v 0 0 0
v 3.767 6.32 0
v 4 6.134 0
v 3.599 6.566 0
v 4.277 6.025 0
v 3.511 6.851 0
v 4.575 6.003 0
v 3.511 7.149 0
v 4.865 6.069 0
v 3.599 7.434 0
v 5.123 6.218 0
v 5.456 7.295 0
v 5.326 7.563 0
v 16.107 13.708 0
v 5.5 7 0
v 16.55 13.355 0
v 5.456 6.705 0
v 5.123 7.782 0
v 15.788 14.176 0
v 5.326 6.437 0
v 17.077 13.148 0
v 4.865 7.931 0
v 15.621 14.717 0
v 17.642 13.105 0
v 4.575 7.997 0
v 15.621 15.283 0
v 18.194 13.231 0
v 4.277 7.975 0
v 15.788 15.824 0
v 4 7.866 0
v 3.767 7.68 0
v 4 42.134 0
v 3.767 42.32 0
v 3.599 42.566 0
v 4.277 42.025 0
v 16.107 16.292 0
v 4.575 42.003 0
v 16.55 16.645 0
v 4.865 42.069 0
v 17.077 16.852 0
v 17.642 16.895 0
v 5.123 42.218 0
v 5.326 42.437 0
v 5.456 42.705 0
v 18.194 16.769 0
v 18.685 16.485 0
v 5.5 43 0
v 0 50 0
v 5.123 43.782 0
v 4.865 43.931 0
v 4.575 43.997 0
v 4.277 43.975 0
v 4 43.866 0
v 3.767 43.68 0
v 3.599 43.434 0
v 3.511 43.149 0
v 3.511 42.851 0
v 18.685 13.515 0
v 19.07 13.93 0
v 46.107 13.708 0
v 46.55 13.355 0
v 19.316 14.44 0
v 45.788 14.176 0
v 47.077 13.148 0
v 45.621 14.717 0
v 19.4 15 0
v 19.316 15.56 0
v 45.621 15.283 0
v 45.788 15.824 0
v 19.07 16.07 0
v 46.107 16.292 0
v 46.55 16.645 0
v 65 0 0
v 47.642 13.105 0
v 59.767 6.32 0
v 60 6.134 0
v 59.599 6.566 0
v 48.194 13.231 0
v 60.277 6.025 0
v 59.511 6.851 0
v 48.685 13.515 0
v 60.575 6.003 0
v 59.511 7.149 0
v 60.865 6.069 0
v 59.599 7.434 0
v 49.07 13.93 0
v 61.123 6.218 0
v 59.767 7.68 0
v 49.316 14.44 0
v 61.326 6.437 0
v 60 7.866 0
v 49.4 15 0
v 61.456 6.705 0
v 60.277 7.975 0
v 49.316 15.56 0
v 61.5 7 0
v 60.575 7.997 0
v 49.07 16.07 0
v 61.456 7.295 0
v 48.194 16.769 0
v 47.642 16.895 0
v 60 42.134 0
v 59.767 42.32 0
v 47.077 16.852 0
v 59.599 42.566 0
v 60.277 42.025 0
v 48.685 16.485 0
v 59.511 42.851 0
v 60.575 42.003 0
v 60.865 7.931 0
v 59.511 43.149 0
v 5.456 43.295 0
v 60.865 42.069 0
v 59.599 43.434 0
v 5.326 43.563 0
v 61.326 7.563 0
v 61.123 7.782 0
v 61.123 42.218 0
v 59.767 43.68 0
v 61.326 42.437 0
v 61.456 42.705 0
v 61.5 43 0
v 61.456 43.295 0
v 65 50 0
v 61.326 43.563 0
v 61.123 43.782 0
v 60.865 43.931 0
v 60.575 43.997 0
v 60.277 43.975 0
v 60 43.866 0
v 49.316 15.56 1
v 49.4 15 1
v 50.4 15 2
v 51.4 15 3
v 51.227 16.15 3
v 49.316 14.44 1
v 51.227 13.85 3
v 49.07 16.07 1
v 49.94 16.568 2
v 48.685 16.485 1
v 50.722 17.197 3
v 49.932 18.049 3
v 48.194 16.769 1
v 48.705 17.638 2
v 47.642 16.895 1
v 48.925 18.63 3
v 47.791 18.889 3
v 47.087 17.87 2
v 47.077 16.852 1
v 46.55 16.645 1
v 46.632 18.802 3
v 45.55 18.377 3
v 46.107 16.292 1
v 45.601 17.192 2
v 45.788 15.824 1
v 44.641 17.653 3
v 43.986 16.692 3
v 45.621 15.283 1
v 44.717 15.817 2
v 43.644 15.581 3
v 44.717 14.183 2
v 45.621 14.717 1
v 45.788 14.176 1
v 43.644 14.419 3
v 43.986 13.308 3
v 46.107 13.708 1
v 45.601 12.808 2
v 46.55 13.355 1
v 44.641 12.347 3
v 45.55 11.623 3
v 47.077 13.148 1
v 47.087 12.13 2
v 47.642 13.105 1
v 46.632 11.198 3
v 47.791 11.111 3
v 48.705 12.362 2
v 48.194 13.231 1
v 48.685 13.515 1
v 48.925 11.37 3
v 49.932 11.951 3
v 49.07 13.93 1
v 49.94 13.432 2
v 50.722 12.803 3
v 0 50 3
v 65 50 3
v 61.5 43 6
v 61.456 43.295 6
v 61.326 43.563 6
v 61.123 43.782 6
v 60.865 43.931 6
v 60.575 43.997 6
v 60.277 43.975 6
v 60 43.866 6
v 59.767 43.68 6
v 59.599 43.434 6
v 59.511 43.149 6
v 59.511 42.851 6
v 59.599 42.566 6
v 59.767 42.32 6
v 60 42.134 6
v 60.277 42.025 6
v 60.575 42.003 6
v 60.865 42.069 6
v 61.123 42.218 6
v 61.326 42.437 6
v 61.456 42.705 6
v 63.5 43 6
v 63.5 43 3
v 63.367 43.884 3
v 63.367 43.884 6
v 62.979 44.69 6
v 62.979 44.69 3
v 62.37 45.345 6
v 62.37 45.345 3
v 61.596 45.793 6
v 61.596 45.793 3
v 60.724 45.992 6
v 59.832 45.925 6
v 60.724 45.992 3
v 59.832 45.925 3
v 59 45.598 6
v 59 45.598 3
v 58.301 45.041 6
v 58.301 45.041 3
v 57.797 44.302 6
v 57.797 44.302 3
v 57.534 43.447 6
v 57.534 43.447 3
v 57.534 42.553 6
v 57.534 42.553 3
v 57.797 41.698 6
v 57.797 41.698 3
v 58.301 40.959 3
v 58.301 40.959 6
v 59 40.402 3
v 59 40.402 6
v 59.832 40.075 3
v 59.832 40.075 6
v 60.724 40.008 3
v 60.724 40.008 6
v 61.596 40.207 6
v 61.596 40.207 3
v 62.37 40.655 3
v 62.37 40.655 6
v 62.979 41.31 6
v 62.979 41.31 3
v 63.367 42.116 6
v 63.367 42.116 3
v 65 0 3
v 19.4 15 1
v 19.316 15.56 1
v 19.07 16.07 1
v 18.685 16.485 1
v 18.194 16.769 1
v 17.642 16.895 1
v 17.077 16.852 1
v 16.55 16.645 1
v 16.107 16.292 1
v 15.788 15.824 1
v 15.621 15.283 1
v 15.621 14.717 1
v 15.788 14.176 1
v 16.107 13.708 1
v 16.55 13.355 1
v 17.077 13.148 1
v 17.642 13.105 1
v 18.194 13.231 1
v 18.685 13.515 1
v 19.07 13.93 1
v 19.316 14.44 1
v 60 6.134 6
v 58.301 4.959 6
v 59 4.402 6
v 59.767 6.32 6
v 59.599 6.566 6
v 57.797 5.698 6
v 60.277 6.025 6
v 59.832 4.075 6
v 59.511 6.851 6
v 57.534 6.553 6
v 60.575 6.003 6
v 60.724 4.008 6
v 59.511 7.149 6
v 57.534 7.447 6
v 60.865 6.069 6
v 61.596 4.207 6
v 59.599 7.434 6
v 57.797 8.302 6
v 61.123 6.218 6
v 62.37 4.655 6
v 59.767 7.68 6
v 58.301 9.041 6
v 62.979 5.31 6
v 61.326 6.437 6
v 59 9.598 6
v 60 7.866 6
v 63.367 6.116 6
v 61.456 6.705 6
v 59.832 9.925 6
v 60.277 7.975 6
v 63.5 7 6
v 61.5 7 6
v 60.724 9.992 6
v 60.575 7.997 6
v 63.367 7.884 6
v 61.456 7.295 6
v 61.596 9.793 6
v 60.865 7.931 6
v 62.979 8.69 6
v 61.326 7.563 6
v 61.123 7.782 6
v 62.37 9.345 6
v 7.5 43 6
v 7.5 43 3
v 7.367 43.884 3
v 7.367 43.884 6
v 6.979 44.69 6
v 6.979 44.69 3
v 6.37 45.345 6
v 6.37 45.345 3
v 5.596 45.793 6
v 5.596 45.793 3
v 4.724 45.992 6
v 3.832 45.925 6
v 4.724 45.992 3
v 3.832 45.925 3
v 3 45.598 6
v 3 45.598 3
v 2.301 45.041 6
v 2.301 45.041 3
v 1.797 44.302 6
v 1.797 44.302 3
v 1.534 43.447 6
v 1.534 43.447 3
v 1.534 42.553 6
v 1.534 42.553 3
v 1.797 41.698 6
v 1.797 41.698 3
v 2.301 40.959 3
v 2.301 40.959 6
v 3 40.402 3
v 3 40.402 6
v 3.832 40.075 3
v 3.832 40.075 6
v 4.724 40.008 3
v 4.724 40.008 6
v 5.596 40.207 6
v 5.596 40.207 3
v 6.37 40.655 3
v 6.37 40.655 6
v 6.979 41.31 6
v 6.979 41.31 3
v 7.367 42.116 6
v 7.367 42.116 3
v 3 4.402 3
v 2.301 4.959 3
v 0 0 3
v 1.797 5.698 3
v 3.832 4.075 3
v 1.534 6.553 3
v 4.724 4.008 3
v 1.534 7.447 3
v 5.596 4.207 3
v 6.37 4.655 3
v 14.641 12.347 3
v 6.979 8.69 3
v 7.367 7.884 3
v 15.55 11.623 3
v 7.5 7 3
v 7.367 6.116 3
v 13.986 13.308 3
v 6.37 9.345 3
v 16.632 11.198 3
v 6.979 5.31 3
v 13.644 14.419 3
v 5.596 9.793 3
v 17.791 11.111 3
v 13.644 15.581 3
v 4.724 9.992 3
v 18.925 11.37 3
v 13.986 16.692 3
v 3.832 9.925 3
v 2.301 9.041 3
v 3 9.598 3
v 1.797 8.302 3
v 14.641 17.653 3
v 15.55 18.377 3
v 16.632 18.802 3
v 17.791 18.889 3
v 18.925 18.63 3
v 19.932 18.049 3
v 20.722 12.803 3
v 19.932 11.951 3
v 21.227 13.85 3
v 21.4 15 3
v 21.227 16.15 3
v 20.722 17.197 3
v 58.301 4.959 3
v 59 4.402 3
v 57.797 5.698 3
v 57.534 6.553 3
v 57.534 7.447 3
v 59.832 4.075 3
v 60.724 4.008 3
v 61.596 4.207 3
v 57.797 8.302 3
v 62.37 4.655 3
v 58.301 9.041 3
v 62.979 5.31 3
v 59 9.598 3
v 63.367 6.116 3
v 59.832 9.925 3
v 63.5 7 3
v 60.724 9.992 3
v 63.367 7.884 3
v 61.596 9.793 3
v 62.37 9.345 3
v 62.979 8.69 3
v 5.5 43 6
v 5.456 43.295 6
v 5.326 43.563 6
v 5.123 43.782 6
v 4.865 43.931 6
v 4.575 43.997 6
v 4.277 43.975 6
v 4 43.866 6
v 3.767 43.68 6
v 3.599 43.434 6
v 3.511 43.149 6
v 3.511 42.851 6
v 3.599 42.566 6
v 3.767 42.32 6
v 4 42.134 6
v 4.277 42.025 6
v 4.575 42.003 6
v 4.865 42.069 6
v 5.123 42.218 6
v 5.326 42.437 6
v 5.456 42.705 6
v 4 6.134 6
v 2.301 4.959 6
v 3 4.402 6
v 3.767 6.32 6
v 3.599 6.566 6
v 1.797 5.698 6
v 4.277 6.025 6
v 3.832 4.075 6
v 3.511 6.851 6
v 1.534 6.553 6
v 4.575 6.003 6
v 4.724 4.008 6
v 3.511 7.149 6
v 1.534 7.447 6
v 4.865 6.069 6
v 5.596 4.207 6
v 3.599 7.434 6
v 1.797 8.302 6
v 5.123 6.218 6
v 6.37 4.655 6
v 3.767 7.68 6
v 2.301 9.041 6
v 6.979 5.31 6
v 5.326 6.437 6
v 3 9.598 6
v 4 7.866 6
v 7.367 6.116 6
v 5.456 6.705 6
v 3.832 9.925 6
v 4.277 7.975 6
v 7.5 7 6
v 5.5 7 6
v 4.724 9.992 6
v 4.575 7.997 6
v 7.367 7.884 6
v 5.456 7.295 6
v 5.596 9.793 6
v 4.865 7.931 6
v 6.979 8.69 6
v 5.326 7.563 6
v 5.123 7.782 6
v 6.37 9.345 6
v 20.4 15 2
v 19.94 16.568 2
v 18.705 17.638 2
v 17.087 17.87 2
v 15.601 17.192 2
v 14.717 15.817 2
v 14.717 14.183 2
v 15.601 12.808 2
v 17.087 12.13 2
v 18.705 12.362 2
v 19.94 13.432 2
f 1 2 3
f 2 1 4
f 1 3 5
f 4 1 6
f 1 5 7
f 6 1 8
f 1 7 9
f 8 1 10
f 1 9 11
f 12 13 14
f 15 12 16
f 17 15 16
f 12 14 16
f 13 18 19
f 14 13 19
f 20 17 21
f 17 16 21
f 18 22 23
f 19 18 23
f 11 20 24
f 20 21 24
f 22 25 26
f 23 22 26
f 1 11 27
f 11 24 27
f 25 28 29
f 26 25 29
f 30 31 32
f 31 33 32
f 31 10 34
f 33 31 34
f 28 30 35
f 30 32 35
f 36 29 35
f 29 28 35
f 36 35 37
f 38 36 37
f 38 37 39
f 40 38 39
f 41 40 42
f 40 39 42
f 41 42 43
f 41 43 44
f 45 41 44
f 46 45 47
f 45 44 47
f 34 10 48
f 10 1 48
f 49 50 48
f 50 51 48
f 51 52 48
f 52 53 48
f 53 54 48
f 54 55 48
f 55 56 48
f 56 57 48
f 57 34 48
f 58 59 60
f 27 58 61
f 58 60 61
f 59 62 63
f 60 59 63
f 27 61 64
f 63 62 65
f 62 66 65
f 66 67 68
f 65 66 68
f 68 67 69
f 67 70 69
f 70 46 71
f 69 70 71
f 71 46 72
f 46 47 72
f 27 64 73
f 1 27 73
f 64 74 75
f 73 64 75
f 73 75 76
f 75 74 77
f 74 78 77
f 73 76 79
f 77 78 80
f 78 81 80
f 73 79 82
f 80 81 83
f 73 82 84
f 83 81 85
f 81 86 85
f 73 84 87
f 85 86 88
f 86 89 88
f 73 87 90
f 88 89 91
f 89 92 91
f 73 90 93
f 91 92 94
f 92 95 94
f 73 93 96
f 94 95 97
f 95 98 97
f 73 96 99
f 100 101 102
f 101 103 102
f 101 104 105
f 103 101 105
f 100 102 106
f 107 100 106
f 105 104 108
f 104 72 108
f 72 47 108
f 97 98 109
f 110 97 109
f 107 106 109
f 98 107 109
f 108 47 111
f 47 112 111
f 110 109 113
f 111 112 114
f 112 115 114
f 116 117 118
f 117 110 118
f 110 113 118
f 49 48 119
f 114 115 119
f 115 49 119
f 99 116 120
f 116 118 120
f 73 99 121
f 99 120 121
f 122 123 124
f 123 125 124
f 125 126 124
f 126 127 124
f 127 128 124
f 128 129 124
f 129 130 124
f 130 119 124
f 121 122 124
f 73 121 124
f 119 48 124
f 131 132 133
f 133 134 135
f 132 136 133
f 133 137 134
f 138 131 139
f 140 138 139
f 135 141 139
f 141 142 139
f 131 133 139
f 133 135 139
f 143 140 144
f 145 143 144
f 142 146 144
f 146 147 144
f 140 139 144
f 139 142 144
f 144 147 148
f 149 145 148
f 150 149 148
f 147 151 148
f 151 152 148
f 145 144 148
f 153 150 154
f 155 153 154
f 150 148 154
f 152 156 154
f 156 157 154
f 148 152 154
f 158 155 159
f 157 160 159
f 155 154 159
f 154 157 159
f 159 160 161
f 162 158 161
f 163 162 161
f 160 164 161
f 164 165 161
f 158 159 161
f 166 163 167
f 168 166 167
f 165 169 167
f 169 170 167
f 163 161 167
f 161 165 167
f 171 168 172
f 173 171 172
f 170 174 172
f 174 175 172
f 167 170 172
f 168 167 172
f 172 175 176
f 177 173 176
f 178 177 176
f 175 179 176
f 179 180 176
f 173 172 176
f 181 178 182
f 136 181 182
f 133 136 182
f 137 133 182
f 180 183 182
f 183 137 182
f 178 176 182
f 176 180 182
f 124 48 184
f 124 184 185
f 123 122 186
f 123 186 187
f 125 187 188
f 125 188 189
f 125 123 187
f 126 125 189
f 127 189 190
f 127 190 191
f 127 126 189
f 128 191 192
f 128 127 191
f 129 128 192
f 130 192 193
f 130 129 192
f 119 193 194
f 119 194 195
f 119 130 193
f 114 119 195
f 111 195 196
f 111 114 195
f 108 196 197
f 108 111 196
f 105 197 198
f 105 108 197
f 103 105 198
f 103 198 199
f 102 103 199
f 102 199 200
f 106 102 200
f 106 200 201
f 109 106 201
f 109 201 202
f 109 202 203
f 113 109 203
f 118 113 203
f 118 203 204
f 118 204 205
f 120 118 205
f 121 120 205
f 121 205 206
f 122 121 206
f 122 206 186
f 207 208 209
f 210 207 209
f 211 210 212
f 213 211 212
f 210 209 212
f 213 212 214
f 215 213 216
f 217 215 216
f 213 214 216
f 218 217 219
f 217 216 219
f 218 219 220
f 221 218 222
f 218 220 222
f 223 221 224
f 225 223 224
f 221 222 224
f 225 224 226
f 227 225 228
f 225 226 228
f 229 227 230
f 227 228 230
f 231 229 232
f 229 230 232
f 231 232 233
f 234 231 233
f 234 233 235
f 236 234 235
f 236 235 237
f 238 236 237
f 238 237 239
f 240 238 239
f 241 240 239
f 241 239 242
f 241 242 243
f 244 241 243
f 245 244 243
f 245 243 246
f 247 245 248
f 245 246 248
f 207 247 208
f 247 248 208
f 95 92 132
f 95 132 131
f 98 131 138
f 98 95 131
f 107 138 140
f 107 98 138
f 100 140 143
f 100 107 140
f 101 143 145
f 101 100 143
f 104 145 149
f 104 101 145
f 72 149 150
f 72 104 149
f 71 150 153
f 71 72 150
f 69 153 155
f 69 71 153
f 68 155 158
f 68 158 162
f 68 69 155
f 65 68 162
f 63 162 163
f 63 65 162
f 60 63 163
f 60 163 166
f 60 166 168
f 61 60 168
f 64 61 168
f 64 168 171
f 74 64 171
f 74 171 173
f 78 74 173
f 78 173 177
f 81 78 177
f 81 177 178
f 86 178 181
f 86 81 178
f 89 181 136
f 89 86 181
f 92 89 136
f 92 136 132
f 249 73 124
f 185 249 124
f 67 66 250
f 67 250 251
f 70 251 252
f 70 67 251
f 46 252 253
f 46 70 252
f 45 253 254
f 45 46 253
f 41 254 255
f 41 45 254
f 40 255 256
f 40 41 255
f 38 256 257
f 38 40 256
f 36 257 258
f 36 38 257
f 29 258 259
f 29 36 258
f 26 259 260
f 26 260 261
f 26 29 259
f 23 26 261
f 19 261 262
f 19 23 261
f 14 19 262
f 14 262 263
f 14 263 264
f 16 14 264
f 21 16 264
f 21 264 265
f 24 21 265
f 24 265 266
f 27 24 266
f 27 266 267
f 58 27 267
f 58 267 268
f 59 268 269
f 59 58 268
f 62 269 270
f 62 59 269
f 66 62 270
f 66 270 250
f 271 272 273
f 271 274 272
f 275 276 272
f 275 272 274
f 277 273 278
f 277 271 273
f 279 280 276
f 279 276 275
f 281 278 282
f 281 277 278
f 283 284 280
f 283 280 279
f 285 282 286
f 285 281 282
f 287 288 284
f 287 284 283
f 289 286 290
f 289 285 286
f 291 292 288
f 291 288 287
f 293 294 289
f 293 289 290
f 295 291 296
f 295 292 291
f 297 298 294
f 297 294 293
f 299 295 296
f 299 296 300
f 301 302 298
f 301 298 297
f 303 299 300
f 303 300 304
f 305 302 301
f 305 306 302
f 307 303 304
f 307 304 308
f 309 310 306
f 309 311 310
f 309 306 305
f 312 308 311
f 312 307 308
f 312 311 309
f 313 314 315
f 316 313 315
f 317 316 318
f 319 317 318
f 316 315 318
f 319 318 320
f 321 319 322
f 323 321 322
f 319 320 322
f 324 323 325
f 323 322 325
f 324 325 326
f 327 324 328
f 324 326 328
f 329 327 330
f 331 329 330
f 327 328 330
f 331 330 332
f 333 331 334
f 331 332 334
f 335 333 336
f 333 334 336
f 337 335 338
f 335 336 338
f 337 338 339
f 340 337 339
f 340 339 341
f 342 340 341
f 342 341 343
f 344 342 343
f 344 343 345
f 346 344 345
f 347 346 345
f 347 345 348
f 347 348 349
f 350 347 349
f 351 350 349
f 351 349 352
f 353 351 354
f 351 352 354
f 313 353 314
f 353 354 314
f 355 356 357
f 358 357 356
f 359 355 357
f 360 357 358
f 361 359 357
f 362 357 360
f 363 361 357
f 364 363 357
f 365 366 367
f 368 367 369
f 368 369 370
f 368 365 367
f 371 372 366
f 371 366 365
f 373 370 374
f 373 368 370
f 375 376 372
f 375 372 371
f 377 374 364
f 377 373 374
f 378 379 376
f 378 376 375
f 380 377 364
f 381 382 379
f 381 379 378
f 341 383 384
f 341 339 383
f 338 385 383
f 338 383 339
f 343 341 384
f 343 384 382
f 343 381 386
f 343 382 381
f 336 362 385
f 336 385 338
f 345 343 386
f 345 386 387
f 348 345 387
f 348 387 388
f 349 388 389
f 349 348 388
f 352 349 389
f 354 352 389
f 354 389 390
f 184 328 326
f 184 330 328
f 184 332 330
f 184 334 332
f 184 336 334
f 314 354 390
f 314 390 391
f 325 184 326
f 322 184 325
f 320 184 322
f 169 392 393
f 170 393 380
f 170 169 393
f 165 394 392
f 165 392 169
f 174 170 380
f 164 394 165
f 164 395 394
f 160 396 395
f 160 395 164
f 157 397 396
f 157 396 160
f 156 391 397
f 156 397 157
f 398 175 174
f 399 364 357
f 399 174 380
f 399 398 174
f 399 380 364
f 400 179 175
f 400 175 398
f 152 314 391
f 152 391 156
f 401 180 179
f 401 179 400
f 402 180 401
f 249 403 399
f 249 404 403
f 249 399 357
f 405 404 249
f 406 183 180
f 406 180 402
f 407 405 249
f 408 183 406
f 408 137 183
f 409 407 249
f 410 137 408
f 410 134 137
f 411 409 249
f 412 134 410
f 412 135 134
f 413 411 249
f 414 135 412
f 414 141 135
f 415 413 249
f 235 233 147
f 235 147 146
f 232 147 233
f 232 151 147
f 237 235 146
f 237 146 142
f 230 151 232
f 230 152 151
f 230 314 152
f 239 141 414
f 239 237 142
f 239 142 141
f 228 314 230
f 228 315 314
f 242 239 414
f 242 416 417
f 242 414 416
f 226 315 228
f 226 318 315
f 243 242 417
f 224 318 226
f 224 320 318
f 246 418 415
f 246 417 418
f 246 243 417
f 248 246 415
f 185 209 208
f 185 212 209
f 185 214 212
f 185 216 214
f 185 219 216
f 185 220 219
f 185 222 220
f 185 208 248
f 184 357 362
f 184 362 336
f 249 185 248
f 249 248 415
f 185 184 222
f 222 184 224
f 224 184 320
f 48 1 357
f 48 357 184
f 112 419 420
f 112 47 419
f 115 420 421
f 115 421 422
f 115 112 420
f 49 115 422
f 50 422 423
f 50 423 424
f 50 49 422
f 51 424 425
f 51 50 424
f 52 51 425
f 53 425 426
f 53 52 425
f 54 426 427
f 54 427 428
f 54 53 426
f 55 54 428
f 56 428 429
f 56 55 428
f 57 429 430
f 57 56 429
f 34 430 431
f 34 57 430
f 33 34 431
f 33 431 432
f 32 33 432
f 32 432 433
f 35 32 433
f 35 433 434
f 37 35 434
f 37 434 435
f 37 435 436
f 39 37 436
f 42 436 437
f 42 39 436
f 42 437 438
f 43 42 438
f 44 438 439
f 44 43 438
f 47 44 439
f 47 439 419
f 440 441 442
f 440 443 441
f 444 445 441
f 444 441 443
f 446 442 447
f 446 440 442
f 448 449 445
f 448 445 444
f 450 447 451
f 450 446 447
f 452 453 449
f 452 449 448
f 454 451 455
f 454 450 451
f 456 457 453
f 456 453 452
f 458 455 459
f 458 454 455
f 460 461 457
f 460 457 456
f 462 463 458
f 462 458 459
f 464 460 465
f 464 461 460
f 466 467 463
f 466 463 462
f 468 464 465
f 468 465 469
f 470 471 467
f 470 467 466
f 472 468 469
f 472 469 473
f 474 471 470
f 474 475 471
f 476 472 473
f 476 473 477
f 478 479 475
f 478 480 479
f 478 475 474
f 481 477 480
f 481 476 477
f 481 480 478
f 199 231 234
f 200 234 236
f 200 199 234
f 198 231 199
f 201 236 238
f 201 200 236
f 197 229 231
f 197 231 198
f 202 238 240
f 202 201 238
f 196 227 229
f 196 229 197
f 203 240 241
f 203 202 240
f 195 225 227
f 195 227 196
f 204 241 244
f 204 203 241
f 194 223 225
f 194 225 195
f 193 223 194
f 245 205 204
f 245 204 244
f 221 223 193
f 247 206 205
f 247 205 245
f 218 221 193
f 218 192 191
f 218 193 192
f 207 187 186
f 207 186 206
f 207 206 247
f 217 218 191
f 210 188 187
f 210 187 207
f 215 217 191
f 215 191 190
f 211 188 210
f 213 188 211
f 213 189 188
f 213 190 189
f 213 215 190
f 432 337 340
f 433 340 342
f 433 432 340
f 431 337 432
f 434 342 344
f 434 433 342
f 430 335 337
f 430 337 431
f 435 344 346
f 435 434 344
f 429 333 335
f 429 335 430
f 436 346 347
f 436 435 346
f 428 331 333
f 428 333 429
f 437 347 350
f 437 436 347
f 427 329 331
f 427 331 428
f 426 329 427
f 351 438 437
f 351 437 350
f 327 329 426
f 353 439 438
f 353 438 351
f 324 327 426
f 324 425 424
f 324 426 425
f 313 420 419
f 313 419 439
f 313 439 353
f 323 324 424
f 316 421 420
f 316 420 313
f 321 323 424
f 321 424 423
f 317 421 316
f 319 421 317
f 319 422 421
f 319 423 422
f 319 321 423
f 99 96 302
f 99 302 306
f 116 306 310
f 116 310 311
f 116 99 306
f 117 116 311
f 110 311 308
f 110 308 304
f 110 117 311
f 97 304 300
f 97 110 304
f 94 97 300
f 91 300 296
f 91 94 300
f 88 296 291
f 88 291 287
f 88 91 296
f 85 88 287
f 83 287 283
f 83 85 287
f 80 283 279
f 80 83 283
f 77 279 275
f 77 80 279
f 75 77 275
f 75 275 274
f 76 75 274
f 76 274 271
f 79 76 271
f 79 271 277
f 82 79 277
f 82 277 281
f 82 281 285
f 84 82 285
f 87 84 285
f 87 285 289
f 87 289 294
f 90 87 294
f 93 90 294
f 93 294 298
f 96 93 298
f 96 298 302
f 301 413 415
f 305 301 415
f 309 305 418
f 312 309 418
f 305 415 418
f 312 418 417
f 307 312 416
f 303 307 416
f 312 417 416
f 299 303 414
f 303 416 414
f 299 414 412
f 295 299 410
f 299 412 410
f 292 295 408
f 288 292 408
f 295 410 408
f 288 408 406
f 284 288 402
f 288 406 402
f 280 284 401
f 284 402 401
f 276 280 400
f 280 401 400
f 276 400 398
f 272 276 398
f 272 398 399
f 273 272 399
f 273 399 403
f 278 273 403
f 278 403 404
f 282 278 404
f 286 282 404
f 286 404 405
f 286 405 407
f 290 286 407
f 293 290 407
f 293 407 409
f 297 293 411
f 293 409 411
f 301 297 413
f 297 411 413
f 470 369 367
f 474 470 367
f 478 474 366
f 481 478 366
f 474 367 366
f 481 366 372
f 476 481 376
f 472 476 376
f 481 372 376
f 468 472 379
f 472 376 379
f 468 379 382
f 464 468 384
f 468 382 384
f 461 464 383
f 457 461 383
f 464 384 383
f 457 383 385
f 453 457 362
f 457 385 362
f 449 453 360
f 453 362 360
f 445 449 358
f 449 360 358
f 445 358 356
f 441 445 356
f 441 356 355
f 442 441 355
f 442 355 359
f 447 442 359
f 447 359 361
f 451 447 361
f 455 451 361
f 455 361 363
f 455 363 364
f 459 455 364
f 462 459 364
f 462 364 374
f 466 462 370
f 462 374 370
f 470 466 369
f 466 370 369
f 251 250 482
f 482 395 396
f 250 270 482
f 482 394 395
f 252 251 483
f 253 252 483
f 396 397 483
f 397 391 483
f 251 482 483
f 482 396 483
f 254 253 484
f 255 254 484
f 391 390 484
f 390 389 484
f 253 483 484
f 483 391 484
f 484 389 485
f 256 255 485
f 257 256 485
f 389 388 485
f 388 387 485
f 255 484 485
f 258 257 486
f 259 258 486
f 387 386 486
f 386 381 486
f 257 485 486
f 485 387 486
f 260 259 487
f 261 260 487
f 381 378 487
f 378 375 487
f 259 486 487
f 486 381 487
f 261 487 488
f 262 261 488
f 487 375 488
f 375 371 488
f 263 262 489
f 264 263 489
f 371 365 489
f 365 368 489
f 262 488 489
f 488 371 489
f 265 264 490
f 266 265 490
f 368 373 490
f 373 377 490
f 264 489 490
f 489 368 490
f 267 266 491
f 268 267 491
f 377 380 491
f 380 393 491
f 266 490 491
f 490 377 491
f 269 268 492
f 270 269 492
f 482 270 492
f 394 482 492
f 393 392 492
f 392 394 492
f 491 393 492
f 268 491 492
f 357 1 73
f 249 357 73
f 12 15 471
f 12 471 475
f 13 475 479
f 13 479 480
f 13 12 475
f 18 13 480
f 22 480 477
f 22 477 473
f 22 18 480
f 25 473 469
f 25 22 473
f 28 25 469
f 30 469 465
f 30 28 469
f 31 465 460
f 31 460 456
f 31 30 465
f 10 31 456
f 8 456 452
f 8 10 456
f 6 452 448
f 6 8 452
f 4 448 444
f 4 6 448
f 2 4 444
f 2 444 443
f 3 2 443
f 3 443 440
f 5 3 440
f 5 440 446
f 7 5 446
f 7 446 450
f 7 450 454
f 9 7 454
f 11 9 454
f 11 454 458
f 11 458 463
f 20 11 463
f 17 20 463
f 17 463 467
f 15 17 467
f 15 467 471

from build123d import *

# Parameters (mm, degrees)
F0_W     = 65
F0_H     = 50
F0_R     = 1
F0_R_2   = 1.9
F1_DEPTH = 3
F2_SIZE  = 2
F3_R     = 3
F3_R_2   = 1
F4_DEPTH = 3


with BuildPart() as f1:
    # F0 (on Top) → F1 (new body)
    with BuildSketch(Plane.XY):
        with Locations((32.5, 25)):
            Rectangle(F0_W, F0_H)
        with Locations((4.5, 7)):
            Circle(F0_R, mode=Mode.SUBTRACT)
        with Locations((17.5, 15)):
            Circle(F0_R_2, mode=Mode.SUBTRACT)
        with Locations((60.5, 7)):
            Circle(F0_R, mode=Mode.SUBTRACT)
        with Locations((47.5, 15)):
            Circle(F0_R_2, mode=Mode.SUBTRACT)
        with Locations((4.5, 43)):
            Circle(F0_R, mode=Mode.SUBTRACT)
        with Locations((60.5, 43)):
            Circle(F0_R, mode=Mode.SUBTRACT)
    extrude(amount=F1_DEPTH)

    # F2
    f2_edges = [f1.edges().sort_by_distance(p)[0] for p in [
        (15.6, 15, 3),
        (45.6, 15, 3),
    ]]
    chamfer(f2_edges, length=F2_SIZE)

    # F3 (on face) → F4 (join)
    with BuildSketch(Plane.XY.offset(3)):
        with Locations((4.5, 43)):
            Circle(F3_R)
        with Locations((4.5, 43)):
            Circle(F3_R_2, mode=Mode.SUBTRACT)
        with Locations((60.5, 43)):
            Circle(F3_R)
        with Locations((60.5, 43)):
            Circle(F3_R_2, mode=Mode.SUBTRACT)
        with Locations((60.5, 7)):
            Circle(F3_R)
        with Locations((60.5, 7)):
            Circle(F3_R_2, mode=Mode.SUBTRACT)
        with Locations((4.5, 7)):
            Circle(F3_R)
        with Locations((4.5, 7)):
            Circle(F3_R_2, mode=Mode.SUBTRACT)
    extrude(amount=F4_DEPTH)


solid = f1.part
